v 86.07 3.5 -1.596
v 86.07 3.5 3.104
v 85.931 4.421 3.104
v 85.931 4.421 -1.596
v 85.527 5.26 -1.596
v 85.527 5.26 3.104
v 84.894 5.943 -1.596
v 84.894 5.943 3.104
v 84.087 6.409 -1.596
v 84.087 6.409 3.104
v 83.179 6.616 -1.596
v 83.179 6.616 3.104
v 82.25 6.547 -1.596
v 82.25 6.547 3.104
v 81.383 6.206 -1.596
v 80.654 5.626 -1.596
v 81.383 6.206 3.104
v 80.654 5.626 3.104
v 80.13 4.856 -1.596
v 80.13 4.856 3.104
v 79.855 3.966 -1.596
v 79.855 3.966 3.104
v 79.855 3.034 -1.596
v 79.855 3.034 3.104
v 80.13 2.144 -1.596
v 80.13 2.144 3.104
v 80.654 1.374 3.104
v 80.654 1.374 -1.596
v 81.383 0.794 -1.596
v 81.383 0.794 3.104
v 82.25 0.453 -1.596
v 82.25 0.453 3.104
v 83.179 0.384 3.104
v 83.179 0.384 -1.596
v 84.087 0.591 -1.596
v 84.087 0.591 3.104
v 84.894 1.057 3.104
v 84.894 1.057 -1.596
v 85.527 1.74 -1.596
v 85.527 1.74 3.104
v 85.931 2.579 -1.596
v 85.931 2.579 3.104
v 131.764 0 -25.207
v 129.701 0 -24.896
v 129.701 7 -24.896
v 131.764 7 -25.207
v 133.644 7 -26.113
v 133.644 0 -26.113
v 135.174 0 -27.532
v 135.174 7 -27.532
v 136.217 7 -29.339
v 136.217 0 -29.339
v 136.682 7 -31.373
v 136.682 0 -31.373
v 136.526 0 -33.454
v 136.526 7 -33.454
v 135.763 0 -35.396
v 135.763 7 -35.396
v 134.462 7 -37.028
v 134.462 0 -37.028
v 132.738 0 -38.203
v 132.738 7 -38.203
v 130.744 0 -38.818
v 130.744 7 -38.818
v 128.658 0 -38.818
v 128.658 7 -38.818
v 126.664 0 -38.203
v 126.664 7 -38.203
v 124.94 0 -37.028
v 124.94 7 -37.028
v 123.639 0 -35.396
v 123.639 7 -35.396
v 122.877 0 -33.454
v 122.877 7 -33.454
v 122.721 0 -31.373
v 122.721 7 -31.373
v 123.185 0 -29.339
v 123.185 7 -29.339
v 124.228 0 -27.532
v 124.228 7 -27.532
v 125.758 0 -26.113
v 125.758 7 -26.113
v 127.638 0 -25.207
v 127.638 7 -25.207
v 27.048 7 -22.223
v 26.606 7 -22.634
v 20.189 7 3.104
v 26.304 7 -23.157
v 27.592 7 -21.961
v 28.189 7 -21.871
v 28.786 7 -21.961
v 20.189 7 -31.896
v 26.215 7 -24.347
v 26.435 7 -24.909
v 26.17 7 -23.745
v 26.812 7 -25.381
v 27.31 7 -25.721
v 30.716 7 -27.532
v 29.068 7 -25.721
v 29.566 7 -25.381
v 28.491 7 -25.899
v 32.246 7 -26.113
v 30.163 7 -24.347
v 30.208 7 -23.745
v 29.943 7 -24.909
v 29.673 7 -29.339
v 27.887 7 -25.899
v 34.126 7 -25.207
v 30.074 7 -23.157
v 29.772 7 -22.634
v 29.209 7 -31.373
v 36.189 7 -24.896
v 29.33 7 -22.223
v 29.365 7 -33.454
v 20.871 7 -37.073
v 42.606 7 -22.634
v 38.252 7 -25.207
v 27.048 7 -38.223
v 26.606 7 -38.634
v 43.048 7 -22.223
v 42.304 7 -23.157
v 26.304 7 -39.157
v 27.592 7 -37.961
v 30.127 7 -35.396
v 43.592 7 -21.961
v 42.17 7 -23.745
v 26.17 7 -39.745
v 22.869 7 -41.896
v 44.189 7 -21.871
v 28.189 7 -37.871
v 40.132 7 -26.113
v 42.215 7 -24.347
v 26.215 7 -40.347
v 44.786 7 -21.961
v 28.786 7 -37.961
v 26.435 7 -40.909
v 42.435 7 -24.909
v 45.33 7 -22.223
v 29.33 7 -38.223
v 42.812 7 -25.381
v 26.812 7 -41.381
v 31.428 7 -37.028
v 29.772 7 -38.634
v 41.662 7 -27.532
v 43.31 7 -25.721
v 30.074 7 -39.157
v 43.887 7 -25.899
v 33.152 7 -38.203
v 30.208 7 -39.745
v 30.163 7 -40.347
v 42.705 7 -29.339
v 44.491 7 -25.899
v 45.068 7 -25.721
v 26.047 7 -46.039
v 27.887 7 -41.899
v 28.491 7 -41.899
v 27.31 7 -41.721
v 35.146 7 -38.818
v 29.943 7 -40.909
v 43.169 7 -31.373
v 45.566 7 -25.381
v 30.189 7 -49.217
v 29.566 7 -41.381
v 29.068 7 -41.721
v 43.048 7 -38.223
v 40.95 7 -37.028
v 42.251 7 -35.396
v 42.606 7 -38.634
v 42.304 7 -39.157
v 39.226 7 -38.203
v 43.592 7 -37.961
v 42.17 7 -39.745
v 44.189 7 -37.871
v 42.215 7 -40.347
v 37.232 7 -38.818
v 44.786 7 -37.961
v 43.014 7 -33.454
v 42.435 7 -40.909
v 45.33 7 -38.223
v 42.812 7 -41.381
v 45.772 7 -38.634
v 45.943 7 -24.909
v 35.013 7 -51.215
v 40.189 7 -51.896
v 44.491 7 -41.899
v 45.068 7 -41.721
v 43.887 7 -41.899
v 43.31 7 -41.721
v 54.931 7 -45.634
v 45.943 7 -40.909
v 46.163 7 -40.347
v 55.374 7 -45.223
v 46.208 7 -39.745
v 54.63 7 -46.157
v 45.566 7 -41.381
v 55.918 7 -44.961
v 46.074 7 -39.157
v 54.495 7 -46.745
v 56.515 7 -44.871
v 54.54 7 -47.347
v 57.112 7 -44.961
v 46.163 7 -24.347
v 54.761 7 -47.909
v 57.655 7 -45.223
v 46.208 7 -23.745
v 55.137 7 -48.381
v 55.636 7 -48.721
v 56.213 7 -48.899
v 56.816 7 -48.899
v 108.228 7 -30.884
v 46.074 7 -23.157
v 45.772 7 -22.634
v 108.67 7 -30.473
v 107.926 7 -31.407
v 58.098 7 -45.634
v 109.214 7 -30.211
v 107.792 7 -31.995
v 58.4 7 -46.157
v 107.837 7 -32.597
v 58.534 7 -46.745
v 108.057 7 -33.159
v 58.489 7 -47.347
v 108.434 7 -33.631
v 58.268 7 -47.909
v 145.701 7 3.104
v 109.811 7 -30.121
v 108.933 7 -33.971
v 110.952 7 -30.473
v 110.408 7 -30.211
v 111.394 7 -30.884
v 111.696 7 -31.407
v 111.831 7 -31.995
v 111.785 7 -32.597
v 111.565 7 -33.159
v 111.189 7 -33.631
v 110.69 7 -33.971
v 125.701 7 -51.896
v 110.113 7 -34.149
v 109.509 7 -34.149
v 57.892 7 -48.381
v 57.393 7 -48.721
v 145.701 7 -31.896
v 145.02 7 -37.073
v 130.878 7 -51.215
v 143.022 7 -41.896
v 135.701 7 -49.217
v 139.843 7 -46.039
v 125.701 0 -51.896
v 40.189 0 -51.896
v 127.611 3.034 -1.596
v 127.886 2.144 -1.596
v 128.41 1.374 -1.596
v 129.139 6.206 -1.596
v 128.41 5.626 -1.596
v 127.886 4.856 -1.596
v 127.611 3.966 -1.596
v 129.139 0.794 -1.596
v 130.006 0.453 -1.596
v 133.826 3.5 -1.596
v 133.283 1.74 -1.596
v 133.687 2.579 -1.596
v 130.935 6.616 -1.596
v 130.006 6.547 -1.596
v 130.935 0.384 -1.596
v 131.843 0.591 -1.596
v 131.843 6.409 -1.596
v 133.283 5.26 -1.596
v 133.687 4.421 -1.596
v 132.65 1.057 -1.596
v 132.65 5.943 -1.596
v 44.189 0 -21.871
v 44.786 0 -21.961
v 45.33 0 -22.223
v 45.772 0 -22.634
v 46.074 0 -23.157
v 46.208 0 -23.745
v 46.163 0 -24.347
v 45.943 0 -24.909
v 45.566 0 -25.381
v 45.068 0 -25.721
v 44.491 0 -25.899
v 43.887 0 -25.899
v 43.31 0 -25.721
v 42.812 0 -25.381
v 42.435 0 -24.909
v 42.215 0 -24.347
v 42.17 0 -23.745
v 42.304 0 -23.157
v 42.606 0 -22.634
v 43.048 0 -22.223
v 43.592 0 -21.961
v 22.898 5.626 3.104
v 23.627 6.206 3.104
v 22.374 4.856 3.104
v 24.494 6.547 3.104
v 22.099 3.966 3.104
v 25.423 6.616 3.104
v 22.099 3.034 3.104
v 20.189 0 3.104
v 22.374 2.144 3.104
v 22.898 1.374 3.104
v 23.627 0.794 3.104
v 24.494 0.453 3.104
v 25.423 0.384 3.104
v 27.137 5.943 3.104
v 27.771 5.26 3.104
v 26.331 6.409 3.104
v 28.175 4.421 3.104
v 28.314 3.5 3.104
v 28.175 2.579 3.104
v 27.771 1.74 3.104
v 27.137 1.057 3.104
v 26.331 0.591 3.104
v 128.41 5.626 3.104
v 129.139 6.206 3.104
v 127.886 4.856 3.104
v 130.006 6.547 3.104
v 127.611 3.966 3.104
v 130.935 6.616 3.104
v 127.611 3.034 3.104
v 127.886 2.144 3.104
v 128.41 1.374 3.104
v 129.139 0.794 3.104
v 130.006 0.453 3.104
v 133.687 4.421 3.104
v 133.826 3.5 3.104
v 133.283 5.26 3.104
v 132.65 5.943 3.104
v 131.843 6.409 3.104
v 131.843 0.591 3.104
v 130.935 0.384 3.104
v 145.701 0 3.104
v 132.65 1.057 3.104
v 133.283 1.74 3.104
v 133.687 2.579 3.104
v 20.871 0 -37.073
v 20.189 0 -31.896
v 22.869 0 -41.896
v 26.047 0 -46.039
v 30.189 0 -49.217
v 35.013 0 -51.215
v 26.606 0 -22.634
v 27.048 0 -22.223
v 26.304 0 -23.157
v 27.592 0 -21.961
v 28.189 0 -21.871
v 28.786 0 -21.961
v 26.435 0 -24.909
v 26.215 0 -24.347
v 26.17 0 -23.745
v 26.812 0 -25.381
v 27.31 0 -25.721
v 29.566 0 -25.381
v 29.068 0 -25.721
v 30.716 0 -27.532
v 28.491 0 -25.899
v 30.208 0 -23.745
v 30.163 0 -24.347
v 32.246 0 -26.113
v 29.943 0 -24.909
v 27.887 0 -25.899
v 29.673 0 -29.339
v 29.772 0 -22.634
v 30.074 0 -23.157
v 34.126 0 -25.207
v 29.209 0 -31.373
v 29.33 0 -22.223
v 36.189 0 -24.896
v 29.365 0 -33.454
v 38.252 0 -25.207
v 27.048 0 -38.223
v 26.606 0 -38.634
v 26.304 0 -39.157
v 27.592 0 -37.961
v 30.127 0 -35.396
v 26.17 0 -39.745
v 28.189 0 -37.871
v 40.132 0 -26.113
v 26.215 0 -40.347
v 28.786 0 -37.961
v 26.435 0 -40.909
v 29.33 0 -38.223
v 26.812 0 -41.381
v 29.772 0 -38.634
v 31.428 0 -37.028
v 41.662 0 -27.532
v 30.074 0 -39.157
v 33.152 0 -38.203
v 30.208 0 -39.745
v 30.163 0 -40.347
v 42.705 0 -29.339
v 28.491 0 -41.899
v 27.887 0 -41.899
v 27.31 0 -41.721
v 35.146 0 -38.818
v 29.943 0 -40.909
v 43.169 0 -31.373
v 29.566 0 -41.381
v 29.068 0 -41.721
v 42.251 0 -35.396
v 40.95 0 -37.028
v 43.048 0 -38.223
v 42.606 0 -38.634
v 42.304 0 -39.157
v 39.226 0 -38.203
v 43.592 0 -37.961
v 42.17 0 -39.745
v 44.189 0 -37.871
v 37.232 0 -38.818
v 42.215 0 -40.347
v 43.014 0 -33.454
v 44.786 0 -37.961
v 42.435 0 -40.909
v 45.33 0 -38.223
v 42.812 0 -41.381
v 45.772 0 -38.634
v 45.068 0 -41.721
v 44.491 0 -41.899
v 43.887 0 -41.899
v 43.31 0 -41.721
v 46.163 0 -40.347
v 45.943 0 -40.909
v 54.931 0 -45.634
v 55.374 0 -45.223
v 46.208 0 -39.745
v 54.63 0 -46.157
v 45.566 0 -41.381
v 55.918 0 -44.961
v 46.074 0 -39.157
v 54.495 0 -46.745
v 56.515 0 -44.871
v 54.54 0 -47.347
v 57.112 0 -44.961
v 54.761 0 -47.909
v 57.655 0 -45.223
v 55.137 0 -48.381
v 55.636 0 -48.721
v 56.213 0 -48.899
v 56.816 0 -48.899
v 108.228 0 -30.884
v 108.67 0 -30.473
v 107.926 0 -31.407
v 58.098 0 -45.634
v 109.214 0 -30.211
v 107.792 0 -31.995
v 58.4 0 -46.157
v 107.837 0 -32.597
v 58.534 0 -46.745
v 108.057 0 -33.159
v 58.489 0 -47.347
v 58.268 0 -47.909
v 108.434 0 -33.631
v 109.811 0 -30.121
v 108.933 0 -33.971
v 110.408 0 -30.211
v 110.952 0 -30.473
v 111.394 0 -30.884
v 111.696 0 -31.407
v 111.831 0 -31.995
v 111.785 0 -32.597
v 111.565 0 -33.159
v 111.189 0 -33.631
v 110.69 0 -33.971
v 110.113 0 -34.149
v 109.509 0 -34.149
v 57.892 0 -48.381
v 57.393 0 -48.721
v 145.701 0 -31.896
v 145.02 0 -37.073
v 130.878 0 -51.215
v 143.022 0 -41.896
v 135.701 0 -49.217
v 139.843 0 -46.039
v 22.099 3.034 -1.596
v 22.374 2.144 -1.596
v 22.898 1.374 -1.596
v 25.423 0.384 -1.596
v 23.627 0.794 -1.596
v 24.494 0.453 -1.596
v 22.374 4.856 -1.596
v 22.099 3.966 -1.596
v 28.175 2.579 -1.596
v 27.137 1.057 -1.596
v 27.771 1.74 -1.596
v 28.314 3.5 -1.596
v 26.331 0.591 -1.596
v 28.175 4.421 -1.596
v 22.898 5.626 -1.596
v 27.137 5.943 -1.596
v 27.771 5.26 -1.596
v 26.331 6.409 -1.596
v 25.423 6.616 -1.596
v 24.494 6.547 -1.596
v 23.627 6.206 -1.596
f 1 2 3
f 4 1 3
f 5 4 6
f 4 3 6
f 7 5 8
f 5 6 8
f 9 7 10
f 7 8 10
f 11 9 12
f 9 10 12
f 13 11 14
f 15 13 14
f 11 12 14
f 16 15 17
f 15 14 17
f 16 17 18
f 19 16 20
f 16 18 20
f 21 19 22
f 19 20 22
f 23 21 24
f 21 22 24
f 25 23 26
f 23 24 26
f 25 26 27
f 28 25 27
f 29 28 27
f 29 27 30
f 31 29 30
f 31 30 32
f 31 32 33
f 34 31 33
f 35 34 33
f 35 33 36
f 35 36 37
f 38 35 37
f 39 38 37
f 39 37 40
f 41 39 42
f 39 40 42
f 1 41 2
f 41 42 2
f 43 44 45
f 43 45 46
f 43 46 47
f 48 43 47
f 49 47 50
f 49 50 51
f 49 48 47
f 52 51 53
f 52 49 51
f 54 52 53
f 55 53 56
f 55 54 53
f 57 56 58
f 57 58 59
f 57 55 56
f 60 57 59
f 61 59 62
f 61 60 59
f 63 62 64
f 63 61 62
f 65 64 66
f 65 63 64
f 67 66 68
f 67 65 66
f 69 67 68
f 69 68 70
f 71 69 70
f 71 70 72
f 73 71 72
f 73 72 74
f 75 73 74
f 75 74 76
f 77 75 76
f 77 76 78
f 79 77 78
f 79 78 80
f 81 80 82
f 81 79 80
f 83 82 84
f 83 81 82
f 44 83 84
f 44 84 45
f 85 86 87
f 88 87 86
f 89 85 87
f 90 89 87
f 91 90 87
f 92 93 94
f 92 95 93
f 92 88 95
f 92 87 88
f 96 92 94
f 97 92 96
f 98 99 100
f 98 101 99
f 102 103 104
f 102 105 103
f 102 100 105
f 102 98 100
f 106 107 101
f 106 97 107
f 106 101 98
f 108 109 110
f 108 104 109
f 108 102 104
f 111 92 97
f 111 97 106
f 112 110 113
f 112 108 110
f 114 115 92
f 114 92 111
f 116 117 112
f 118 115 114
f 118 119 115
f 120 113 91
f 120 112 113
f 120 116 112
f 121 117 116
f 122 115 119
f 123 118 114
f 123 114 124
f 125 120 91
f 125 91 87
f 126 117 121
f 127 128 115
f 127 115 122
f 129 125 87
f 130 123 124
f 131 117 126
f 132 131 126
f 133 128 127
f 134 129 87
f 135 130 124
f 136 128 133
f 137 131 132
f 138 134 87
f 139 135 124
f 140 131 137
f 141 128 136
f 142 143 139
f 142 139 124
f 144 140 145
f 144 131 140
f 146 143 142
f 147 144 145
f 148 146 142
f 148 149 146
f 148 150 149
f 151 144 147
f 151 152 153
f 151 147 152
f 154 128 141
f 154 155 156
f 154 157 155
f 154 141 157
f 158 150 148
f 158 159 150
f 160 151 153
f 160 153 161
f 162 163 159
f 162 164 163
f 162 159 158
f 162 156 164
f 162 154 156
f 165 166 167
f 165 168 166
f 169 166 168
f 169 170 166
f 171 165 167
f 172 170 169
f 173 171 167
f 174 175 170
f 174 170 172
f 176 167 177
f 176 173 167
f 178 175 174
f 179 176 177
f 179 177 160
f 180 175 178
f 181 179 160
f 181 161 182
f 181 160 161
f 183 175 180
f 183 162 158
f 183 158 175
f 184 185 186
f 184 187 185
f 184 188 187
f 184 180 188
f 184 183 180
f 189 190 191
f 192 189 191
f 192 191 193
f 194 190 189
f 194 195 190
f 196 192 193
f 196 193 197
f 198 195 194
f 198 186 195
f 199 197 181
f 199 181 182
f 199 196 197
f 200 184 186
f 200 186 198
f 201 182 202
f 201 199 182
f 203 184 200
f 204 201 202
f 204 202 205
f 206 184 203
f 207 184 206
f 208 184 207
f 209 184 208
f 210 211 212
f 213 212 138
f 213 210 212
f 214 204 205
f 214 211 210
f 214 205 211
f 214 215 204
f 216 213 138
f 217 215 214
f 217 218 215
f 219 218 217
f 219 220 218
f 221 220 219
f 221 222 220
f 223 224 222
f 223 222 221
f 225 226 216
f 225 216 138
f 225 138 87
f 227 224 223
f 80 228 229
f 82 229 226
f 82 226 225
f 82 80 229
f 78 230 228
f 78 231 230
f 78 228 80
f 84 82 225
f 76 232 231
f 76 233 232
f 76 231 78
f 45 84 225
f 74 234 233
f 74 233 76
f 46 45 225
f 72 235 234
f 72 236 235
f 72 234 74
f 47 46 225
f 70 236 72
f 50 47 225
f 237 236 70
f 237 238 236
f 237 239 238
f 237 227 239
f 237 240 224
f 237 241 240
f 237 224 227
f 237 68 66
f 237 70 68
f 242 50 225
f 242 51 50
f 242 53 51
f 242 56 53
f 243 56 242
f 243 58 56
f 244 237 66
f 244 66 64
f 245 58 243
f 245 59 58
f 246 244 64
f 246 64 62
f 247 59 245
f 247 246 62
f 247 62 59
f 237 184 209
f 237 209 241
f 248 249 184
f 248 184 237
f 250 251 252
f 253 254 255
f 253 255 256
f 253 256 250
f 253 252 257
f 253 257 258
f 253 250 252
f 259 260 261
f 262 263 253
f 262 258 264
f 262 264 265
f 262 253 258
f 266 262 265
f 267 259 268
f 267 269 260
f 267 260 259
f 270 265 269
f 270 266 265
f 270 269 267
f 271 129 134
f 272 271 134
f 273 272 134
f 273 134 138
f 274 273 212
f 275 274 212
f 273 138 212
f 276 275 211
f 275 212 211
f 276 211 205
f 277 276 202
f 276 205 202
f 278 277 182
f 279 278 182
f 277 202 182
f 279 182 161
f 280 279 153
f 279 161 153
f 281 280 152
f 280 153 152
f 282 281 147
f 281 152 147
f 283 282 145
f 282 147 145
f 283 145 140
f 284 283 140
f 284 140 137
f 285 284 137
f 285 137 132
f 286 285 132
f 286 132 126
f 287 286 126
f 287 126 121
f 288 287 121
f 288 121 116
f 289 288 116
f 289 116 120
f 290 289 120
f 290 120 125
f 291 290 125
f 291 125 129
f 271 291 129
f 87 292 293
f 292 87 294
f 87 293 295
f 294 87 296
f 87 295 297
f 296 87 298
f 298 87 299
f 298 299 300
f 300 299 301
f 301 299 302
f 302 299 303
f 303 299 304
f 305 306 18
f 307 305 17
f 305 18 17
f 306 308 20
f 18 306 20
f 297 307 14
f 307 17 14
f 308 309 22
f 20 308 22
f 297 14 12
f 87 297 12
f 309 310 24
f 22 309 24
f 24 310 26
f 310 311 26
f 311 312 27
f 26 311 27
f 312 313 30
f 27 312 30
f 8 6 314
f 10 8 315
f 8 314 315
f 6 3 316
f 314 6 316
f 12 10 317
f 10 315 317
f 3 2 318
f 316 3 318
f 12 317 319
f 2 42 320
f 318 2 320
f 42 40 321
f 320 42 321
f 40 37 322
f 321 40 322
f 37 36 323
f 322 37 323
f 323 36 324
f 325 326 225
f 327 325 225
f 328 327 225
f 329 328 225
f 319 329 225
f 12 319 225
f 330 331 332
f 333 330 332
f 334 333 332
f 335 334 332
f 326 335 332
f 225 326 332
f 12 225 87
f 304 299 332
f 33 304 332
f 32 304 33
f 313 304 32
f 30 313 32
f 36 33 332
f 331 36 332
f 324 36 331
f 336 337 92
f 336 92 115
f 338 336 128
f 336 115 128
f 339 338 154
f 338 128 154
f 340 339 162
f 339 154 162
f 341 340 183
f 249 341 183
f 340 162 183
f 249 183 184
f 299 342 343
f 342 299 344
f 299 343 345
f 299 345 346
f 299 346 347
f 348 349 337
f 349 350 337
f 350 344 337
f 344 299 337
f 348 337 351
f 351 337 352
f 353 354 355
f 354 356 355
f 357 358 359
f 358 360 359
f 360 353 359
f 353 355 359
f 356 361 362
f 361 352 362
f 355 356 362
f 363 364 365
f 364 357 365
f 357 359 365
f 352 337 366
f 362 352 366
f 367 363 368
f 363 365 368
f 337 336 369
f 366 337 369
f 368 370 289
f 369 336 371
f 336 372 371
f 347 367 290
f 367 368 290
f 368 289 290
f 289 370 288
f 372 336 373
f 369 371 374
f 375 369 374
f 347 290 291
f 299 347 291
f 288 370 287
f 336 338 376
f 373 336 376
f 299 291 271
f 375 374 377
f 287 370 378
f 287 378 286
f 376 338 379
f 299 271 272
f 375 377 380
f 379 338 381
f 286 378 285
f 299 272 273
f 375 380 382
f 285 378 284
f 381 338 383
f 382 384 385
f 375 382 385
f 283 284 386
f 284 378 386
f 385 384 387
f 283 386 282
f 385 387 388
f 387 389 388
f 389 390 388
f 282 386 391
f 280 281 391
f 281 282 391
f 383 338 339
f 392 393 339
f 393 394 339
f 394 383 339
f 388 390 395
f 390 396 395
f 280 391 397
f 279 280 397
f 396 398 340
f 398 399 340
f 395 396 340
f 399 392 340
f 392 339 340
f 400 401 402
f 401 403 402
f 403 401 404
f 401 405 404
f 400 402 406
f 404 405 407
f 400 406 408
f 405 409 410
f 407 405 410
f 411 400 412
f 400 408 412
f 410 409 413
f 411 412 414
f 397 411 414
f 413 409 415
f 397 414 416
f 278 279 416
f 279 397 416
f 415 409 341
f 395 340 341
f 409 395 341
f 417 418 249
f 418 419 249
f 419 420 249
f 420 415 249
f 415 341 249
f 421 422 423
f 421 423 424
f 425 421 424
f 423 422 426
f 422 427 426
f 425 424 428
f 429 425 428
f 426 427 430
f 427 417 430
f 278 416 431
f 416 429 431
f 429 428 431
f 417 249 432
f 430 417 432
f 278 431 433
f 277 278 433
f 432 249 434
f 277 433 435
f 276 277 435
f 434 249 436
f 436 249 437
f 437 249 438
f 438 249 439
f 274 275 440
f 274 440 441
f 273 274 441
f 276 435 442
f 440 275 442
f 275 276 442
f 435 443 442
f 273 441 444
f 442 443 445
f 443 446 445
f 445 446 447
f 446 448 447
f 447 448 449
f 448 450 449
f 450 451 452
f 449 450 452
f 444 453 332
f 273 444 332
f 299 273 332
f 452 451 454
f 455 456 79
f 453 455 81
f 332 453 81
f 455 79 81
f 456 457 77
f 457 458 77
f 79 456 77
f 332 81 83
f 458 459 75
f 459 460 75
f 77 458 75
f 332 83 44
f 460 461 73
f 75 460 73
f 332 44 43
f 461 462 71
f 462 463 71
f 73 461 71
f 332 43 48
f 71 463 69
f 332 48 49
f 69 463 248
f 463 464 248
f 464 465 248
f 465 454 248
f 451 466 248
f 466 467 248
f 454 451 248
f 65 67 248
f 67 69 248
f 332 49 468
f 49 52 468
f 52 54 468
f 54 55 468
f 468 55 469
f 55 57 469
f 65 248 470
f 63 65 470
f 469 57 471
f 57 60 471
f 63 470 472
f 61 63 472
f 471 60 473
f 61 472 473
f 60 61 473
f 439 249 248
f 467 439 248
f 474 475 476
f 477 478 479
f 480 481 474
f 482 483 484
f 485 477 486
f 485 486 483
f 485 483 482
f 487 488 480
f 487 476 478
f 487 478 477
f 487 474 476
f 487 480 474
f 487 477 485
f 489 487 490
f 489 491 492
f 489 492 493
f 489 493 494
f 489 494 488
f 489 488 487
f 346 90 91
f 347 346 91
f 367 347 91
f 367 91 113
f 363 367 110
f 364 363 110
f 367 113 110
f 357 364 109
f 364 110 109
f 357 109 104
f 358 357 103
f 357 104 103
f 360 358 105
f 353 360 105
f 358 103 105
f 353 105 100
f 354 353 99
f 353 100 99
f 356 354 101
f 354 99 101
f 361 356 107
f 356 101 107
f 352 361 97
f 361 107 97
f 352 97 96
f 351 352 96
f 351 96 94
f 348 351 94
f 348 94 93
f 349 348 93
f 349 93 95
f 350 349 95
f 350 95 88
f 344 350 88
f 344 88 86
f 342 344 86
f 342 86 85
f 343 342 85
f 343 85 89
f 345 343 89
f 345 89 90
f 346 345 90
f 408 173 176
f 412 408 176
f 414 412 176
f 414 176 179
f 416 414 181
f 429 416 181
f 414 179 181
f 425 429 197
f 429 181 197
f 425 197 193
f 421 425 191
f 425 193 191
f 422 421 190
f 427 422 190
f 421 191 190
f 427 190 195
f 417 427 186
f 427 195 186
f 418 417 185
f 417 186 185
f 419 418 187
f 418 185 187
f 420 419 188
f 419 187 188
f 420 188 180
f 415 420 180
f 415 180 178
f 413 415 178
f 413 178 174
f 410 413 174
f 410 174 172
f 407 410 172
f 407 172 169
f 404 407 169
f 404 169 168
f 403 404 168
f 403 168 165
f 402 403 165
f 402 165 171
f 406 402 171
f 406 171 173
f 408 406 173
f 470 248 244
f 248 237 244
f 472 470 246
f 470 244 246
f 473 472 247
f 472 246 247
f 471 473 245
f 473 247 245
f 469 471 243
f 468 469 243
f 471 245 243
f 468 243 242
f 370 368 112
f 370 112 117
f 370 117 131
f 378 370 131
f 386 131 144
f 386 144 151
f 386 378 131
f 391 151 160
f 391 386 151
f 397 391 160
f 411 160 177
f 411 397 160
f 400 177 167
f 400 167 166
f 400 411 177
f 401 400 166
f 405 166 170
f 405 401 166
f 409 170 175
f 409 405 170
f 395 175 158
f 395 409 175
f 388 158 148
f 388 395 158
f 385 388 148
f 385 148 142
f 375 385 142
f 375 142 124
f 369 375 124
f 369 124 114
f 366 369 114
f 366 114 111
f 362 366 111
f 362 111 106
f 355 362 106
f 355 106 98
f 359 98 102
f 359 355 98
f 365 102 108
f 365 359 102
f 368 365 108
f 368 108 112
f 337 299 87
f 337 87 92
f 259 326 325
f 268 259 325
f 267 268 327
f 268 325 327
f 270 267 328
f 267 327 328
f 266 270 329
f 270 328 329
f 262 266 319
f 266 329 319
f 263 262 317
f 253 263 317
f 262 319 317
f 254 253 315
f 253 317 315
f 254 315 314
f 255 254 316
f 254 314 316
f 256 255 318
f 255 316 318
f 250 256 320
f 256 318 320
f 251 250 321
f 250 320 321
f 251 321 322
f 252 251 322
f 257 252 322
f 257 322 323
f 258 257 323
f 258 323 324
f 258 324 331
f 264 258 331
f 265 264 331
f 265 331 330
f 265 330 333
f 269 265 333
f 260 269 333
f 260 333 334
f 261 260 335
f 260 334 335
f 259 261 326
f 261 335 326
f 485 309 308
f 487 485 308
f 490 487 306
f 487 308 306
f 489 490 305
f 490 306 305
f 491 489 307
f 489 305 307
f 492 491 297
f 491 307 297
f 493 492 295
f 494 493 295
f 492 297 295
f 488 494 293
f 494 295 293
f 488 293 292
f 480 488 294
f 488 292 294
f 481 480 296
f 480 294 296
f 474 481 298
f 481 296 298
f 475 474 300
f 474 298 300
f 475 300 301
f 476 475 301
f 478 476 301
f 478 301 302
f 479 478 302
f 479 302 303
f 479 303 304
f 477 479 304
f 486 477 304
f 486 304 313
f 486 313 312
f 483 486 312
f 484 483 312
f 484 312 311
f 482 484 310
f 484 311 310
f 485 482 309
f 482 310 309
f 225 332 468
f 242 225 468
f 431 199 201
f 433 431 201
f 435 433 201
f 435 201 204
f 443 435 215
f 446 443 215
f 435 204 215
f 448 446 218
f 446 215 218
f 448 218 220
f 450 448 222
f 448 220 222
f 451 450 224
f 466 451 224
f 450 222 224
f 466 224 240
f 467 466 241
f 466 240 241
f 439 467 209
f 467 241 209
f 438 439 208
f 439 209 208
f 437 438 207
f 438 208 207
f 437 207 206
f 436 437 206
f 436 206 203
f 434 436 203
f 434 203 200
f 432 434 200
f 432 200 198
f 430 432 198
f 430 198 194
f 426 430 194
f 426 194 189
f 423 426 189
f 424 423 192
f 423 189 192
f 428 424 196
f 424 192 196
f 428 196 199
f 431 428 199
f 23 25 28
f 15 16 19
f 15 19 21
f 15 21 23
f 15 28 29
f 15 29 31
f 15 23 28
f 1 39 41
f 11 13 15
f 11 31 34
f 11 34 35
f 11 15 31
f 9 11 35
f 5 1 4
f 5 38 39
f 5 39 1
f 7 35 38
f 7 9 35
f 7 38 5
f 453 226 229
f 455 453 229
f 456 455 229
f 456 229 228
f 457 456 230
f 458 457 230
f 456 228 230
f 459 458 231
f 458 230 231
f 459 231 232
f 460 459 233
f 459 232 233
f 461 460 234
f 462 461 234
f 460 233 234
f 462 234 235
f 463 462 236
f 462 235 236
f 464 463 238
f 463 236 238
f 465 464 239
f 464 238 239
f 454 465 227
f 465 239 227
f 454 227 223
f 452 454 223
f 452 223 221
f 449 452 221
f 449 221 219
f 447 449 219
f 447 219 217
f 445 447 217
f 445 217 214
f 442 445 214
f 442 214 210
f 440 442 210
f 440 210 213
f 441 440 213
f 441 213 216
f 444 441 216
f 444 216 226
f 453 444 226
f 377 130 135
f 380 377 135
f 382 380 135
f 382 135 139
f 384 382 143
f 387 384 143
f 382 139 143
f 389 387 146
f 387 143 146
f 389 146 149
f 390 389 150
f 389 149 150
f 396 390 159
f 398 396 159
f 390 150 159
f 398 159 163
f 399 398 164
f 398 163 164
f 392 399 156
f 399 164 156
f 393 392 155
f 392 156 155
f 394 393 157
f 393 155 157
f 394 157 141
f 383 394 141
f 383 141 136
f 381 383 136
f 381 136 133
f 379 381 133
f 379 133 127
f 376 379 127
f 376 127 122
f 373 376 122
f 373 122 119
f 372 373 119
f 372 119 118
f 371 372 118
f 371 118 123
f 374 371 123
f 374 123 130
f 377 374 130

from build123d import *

# Parameters (mm, degrees)
SKETCH2_W           = 125.512132551
SKETCH2_H           = 55
SKETCH2_R           = 7
BOSS_EXTRUDE1_DEPTH = 7
FILLET4_R           = 20
SKETCH5_R           = 2.025
CUT_EXTRUDE1_DEPTH  = 10
SKETCH6_R           = 2.025
CUT_EXTRUDE2_DEPTH  = 33
SKETCH7_R           = 3.125
CUT_EXTRUDE3_DEPTH  = 4.7
SKETCH8_R           = 2.025
CUT_EXTRUDE4_DEPTH  = 7


with BuildPart() as part:
    # Sketch2 → Boss-Extrude1 (new body)
    with BuildSketch(Plane(origin=(0, 0, 0), x_dir=(1, 0, 0), z_dir=(0, 1, 0))):
        with Locations((82.945127875, 24.3964427)):
            Rectangle(SKETCH2_W, SKETCH2_H)
        with Locations(Location((36.189061599, 31.8964427, 0), (0, 0, 270))):
            Circle(SKETCH2_R, mode=Mode.SUBTRACT)
        with Locations(Location((129.70119415, 31.8964427, 0), (0, 0, 270))):
            Circle(SKETCH2_R, mode=Mode.SUBTRACT)
    extrude(amount=BOSS_EXTRUDE1_DEPTH)

    # Fillet4
    fillet4_edges = [part.edges().sort_by_distance(p)[0] for p in [
        (145.70119415, 3.5, -51.8964427),
        (20.189061599, 3.5, -51.8964427),
    ]]
    fillet(fillet4_edges, radius=FILLET4_R)

    # Sketch5 → Cut-Extrude1 (cut)
    with BuildSketch(Plane(origin=(0, 7, 0), x_dir=(1, 0, 0), z_dir=(0, 1, 0))):
        with Locations(Location((109.81119415, 32.1464427, 0), (0, 0, 270))):
            Circle(SKETCH5_R)
    extrude(amount=-CUT_EXTRUDE1_DEPTH, mode=Mode.SUBTRACT)

    # Sketch6 → Cut-Extrude2 (cut)
    with BuildSketch(Plane(origin=(0, 7, 0), x_dir=(1, 0, 0), z_dir=(0, 1, 0))):
        with Locations(Location((28.189061599, 39.8964427, 0), (0, 0, 270))):
            Circle(SKETCH6_R)
        with Locations(Location((44.189061599, 39.8964427, 0), (0, 0, 270))):
            Circle(SKETCH6_R)
        with Locations(Location((44.189061599, 23.8964427, 0), (0, 0, 270))):
            Circle(SKETCH6_R)
        with Locations(Location((28.189061599, 23.8964427, 0), (0, 0, 270))):
            Circle(SKETCH6_R)
    extrude(amount=-CUT_EXTRUDE2_DEPTH, mode=Mode.SUBTRACT)

    # Sketch7 → Cut-Extrude3 (cut)
    with BuildSketch(Plane.XY.offset(3.1035573)):
        with Locations((25.189061599, 3.5)):
            Circle(SKETCH7_R)
        with Locations((130.70119415, 3.5)):
            Circle(SKETCH7_R)
        with Locations((82.945127875, 3.5)):
            Circle(SKETCH7_R)
    extrude(amount=-CUT_EXTRUDE3_DEPTH, mode=Mode.SUBTRACT)

    # Sketch8 → Cut-Extrude4 (cut)
    with BuildSketch(Plane(origin=(0, 7, 0), x_dir=(1, 0, 0), z_dir=(0, 1, 0))):
        with Locations(Location((56.514656449, 46.8964427, 0), (0, 0, 270))):
            Circle(SKETCH8_R)
    extrude(amount=-CUT_EXTRUDE4_DEPTH, mode=Mode.SUBTRACT)


solid = part.part
